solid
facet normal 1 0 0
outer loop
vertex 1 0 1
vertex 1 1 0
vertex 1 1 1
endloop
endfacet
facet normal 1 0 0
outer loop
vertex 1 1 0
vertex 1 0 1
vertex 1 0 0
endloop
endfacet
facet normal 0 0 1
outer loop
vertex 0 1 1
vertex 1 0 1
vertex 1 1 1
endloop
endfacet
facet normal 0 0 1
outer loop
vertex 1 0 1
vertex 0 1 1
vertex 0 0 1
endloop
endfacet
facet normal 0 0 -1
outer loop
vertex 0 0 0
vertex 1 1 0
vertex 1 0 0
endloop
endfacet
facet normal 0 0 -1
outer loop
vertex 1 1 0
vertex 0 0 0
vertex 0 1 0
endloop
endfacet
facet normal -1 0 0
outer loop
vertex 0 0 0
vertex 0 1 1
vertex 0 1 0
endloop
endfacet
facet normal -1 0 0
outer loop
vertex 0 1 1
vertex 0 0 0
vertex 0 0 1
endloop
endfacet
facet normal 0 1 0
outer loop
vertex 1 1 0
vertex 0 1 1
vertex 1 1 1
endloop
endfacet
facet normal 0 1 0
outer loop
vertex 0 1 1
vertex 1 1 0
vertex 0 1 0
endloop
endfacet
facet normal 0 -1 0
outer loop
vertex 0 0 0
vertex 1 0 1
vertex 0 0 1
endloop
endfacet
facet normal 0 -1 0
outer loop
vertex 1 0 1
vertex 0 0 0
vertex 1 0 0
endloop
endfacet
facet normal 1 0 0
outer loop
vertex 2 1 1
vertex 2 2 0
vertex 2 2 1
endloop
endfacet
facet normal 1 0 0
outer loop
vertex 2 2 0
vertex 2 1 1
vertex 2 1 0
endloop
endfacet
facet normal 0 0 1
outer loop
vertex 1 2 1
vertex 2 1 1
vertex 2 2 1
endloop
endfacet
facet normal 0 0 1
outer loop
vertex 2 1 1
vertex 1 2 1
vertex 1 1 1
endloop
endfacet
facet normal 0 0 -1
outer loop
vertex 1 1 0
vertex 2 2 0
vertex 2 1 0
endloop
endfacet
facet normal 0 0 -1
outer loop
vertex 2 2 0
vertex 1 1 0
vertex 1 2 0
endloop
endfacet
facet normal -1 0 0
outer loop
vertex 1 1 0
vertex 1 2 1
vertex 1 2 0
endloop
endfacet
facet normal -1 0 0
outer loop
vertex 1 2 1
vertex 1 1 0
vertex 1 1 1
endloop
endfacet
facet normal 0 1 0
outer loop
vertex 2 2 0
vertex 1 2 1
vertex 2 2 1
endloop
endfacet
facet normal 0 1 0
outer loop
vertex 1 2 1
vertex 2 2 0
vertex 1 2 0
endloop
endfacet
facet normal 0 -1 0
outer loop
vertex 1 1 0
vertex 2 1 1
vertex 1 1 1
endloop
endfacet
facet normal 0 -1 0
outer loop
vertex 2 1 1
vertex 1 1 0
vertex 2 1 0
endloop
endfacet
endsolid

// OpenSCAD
union() { cube([1,1,1]); translate([1,1,0]) cube([1,1,1]); }
